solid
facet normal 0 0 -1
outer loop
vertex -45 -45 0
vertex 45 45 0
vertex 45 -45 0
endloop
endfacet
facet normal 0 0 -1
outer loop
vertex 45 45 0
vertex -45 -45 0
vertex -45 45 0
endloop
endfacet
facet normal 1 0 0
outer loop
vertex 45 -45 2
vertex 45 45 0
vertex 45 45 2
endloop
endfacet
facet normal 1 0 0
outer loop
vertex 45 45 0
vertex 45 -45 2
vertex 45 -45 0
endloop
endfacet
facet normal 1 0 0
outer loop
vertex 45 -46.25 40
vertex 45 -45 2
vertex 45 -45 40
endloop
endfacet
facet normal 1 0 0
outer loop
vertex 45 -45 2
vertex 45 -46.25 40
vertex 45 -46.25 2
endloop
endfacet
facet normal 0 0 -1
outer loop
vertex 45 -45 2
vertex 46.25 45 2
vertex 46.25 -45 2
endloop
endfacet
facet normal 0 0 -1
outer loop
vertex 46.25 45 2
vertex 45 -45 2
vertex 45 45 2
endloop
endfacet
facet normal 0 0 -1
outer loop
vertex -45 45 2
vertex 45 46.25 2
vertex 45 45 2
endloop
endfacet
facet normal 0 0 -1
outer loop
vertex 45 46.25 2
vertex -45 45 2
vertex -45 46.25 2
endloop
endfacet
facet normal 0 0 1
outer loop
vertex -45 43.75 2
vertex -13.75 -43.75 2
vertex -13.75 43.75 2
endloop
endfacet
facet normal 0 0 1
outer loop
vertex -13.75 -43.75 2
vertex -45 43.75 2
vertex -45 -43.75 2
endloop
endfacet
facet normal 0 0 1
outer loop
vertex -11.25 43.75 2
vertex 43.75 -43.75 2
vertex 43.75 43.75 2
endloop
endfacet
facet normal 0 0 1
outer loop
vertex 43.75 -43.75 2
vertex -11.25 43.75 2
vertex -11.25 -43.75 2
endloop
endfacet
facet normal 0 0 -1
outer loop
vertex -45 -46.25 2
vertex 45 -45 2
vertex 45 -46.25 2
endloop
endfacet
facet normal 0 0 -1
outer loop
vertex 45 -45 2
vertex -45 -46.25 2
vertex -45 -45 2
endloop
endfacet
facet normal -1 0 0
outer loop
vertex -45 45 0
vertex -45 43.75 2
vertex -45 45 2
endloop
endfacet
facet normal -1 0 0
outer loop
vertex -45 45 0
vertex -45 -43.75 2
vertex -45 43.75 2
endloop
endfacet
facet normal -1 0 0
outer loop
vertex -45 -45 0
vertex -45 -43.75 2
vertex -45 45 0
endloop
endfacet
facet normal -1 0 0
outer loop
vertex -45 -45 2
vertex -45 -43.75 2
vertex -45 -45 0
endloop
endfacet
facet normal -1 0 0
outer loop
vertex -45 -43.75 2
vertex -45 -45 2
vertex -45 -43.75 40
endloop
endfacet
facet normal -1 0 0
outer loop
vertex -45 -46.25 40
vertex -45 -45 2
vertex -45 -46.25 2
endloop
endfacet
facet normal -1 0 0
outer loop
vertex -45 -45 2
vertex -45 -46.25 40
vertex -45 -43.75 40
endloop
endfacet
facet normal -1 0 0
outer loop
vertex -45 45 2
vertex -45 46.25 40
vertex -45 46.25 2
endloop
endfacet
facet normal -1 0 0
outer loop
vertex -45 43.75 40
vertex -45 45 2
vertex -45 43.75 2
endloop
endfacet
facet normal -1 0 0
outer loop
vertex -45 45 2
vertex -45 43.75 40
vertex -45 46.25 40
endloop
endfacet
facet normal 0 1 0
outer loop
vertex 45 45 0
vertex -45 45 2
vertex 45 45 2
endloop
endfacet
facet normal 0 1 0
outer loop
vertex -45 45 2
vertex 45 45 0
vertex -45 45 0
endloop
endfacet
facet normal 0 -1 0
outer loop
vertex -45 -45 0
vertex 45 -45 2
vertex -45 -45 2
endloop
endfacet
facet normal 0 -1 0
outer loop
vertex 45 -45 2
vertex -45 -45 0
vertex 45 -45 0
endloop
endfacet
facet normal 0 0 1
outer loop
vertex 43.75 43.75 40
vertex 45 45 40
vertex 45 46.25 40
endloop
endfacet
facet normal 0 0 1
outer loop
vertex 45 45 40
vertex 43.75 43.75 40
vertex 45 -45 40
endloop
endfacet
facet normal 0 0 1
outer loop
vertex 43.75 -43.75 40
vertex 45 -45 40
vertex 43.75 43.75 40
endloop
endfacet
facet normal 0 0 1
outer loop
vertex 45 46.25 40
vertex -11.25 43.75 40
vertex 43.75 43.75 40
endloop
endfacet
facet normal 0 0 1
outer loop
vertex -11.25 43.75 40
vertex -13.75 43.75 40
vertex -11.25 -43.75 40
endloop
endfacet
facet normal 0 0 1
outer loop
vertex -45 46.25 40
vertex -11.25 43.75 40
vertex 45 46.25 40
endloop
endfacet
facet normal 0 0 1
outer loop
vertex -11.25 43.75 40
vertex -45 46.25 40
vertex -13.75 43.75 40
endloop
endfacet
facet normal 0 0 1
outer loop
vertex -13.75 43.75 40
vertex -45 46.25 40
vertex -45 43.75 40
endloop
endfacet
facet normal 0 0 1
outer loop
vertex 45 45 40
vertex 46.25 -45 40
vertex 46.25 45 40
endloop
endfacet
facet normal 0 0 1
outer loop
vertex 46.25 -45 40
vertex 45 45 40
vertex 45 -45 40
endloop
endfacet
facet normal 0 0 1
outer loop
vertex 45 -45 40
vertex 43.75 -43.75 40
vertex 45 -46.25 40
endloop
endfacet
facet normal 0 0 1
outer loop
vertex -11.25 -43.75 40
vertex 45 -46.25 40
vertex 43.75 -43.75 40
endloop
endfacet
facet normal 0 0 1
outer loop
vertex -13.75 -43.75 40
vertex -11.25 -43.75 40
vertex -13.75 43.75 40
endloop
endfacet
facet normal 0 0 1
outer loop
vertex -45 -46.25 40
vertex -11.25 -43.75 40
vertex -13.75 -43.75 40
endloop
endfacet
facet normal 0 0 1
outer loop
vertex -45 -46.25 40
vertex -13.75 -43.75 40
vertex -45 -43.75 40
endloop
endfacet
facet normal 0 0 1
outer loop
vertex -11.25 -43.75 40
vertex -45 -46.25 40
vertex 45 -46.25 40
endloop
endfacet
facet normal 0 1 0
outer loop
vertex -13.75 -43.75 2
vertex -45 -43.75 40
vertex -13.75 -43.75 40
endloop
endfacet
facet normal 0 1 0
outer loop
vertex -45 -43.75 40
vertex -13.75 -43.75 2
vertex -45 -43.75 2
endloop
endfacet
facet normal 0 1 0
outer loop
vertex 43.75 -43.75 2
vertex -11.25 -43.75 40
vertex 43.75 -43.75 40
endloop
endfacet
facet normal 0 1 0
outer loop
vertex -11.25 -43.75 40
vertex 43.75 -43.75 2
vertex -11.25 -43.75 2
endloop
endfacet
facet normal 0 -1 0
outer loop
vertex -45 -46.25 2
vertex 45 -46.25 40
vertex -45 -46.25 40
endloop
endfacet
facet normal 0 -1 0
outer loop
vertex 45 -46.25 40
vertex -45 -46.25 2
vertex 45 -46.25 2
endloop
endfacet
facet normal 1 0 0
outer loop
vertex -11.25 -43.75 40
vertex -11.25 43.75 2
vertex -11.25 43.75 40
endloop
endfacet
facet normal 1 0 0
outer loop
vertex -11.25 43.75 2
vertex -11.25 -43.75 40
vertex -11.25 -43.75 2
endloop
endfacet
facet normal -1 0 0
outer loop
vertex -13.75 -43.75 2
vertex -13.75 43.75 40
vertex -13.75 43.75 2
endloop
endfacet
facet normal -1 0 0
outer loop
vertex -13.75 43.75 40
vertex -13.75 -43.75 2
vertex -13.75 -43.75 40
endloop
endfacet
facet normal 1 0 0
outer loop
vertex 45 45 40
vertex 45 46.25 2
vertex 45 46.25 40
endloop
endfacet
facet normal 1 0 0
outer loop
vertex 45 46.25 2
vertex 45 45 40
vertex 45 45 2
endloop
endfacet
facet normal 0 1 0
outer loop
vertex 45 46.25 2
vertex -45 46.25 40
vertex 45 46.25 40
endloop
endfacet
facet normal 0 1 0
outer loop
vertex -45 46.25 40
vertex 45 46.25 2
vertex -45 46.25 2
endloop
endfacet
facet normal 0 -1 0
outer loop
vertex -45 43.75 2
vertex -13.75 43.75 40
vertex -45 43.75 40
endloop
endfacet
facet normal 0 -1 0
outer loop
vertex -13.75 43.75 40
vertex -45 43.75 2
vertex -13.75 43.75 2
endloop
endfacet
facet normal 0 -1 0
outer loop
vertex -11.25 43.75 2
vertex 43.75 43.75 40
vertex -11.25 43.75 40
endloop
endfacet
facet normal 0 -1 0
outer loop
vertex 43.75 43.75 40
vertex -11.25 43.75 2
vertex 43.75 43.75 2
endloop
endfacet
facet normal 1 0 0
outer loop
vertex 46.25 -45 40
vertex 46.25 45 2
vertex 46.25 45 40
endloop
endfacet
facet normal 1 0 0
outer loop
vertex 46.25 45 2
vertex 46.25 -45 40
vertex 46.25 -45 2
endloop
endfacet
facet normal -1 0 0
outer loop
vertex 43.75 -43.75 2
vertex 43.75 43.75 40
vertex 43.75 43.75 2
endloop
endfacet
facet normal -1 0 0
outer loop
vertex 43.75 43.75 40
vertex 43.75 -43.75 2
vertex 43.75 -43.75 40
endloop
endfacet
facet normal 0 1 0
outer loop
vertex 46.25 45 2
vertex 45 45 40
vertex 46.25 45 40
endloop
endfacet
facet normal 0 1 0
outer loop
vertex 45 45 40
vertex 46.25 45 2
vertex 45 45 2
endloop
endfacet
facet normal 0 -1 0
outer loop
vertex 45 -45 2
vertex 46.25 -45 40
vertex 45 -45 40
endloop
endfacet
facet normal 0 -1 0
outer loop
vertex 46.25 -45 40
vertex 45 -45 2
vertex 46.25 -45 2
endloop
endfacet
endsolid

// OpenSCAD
// Built by bench/smallmodels/features/compiler.py from a list of features.
$fn = 64;
difference() {
  union() {
    translate([0, 0, 0]) translate([-45, -45, 0]) cube([90, 90, 2]);
  }
  union() {
    translate([-20.8125, -20.8125, -2]) rotate([0, 0, 0]) translate([-35.75, -35.75, 0]) cube([71.5, 71.5, 2]);
    translate([-6.9375, -20.8125, -2]) rotate([0, 0, 0]) translate([-35.75, -35.75, 0]) cube([71.5, 71.5, 2]);
    translate([6.9375, -20.8125, -2]) rotate([0, 0, 0]) translate([-35.75, -35.75, 0]) cube([71.5, 71.5, 2]);
    translate([20.8125, -20.8125, -2]) rotate([0, 0, 0]) translate([-35.75, -35.75, 0]) cube([71.5, 71.5, 2]);
    translate([-20.8125, -6.9375, -2]) rotate([0, 0, 0]) translate([-35.75, -35.75, 0]) cube([71.5, 71.5, 2]);
    translate([-6.9375, -6.9375, -2]) rotate([0, 0, 0]) translate([-35.75, -35.75, 0]) cube([71.5, 71.5, 2]);
    translate([6.9375, -6.9375, -2]) rotate([0, 0, 0]) translate([-35.75, -35.75, 0]) cube([71.5, 71.5, 2]);
    translate([20.8125, -6.9375, -2]) rotate([0, 0, 0]) translate([-35.75, -35.75, 0]) cube([71.5, 71.5, 2]);
    translate([-20.8125, 6.9375, -2]) rotate([0, 0, 0]) translate([-35.75, -35.75, 0]) cube([71.5, 71.5, 2]);
    translate([-6.9375, 6.9375, -2]) rotate([0, 0, 0]) translate([-35.75, -35.75, 0]) cube([71.5, 71.5, 2]);
    translate([6.9375, 6.9375, -2]) rotate([0, 0, 0]) translate([-35.75, -35.75, 0]) cube([71.5, 71.5, 2]);
    translate([20.8125, 6.9375, -2]) rotate([0, 0, 0]) translate([-35.75, -35.75, 0]) cube([71.5, 71.5, 2]);
    translate([-20.8125, 20.8125, -2]) rotate([0, 0, 0]) translate([-35.75, -35.75, 0]) cube([71.5, 71.5, 2]);
    translate([-6.9375, 20.8125, -2]) rotate([0, 0, 0]) translate([-35.75, -35.75, 0]) cube([71.5, 71.5, 2]);
    translate([6.9375, 20.8125, -2]) rotate([0, 0, 0]) translate([-35.75, -35.75, 0]) cube([71.5, 71.5, 2]);
    translate([20.8125, 20.8125, -2]) rotate([0, 0, 0]) translate([-35.75, -35.75, 0]) cube([71.5, 71.5, 2]);
  }
}
union() {
    translate([0, -45, 2]) translate([-45, -1.25, 0]) cube([90, 2.5, 38]);
  }
union() {
    translate([-12.5, 0, 2]) translate([-1.25, -45, 0]) cube([2.5, 90, 38]);
  }
union() {
    translate([0, 45, 2]) translate([-45, -1.25, 0]) cube([90, 2.5, 38]);
  }
union() {
    translate([45, 0, 2]) translate([-1.25, -45, 0]) cube([2.5, 90, 38]);
  }
